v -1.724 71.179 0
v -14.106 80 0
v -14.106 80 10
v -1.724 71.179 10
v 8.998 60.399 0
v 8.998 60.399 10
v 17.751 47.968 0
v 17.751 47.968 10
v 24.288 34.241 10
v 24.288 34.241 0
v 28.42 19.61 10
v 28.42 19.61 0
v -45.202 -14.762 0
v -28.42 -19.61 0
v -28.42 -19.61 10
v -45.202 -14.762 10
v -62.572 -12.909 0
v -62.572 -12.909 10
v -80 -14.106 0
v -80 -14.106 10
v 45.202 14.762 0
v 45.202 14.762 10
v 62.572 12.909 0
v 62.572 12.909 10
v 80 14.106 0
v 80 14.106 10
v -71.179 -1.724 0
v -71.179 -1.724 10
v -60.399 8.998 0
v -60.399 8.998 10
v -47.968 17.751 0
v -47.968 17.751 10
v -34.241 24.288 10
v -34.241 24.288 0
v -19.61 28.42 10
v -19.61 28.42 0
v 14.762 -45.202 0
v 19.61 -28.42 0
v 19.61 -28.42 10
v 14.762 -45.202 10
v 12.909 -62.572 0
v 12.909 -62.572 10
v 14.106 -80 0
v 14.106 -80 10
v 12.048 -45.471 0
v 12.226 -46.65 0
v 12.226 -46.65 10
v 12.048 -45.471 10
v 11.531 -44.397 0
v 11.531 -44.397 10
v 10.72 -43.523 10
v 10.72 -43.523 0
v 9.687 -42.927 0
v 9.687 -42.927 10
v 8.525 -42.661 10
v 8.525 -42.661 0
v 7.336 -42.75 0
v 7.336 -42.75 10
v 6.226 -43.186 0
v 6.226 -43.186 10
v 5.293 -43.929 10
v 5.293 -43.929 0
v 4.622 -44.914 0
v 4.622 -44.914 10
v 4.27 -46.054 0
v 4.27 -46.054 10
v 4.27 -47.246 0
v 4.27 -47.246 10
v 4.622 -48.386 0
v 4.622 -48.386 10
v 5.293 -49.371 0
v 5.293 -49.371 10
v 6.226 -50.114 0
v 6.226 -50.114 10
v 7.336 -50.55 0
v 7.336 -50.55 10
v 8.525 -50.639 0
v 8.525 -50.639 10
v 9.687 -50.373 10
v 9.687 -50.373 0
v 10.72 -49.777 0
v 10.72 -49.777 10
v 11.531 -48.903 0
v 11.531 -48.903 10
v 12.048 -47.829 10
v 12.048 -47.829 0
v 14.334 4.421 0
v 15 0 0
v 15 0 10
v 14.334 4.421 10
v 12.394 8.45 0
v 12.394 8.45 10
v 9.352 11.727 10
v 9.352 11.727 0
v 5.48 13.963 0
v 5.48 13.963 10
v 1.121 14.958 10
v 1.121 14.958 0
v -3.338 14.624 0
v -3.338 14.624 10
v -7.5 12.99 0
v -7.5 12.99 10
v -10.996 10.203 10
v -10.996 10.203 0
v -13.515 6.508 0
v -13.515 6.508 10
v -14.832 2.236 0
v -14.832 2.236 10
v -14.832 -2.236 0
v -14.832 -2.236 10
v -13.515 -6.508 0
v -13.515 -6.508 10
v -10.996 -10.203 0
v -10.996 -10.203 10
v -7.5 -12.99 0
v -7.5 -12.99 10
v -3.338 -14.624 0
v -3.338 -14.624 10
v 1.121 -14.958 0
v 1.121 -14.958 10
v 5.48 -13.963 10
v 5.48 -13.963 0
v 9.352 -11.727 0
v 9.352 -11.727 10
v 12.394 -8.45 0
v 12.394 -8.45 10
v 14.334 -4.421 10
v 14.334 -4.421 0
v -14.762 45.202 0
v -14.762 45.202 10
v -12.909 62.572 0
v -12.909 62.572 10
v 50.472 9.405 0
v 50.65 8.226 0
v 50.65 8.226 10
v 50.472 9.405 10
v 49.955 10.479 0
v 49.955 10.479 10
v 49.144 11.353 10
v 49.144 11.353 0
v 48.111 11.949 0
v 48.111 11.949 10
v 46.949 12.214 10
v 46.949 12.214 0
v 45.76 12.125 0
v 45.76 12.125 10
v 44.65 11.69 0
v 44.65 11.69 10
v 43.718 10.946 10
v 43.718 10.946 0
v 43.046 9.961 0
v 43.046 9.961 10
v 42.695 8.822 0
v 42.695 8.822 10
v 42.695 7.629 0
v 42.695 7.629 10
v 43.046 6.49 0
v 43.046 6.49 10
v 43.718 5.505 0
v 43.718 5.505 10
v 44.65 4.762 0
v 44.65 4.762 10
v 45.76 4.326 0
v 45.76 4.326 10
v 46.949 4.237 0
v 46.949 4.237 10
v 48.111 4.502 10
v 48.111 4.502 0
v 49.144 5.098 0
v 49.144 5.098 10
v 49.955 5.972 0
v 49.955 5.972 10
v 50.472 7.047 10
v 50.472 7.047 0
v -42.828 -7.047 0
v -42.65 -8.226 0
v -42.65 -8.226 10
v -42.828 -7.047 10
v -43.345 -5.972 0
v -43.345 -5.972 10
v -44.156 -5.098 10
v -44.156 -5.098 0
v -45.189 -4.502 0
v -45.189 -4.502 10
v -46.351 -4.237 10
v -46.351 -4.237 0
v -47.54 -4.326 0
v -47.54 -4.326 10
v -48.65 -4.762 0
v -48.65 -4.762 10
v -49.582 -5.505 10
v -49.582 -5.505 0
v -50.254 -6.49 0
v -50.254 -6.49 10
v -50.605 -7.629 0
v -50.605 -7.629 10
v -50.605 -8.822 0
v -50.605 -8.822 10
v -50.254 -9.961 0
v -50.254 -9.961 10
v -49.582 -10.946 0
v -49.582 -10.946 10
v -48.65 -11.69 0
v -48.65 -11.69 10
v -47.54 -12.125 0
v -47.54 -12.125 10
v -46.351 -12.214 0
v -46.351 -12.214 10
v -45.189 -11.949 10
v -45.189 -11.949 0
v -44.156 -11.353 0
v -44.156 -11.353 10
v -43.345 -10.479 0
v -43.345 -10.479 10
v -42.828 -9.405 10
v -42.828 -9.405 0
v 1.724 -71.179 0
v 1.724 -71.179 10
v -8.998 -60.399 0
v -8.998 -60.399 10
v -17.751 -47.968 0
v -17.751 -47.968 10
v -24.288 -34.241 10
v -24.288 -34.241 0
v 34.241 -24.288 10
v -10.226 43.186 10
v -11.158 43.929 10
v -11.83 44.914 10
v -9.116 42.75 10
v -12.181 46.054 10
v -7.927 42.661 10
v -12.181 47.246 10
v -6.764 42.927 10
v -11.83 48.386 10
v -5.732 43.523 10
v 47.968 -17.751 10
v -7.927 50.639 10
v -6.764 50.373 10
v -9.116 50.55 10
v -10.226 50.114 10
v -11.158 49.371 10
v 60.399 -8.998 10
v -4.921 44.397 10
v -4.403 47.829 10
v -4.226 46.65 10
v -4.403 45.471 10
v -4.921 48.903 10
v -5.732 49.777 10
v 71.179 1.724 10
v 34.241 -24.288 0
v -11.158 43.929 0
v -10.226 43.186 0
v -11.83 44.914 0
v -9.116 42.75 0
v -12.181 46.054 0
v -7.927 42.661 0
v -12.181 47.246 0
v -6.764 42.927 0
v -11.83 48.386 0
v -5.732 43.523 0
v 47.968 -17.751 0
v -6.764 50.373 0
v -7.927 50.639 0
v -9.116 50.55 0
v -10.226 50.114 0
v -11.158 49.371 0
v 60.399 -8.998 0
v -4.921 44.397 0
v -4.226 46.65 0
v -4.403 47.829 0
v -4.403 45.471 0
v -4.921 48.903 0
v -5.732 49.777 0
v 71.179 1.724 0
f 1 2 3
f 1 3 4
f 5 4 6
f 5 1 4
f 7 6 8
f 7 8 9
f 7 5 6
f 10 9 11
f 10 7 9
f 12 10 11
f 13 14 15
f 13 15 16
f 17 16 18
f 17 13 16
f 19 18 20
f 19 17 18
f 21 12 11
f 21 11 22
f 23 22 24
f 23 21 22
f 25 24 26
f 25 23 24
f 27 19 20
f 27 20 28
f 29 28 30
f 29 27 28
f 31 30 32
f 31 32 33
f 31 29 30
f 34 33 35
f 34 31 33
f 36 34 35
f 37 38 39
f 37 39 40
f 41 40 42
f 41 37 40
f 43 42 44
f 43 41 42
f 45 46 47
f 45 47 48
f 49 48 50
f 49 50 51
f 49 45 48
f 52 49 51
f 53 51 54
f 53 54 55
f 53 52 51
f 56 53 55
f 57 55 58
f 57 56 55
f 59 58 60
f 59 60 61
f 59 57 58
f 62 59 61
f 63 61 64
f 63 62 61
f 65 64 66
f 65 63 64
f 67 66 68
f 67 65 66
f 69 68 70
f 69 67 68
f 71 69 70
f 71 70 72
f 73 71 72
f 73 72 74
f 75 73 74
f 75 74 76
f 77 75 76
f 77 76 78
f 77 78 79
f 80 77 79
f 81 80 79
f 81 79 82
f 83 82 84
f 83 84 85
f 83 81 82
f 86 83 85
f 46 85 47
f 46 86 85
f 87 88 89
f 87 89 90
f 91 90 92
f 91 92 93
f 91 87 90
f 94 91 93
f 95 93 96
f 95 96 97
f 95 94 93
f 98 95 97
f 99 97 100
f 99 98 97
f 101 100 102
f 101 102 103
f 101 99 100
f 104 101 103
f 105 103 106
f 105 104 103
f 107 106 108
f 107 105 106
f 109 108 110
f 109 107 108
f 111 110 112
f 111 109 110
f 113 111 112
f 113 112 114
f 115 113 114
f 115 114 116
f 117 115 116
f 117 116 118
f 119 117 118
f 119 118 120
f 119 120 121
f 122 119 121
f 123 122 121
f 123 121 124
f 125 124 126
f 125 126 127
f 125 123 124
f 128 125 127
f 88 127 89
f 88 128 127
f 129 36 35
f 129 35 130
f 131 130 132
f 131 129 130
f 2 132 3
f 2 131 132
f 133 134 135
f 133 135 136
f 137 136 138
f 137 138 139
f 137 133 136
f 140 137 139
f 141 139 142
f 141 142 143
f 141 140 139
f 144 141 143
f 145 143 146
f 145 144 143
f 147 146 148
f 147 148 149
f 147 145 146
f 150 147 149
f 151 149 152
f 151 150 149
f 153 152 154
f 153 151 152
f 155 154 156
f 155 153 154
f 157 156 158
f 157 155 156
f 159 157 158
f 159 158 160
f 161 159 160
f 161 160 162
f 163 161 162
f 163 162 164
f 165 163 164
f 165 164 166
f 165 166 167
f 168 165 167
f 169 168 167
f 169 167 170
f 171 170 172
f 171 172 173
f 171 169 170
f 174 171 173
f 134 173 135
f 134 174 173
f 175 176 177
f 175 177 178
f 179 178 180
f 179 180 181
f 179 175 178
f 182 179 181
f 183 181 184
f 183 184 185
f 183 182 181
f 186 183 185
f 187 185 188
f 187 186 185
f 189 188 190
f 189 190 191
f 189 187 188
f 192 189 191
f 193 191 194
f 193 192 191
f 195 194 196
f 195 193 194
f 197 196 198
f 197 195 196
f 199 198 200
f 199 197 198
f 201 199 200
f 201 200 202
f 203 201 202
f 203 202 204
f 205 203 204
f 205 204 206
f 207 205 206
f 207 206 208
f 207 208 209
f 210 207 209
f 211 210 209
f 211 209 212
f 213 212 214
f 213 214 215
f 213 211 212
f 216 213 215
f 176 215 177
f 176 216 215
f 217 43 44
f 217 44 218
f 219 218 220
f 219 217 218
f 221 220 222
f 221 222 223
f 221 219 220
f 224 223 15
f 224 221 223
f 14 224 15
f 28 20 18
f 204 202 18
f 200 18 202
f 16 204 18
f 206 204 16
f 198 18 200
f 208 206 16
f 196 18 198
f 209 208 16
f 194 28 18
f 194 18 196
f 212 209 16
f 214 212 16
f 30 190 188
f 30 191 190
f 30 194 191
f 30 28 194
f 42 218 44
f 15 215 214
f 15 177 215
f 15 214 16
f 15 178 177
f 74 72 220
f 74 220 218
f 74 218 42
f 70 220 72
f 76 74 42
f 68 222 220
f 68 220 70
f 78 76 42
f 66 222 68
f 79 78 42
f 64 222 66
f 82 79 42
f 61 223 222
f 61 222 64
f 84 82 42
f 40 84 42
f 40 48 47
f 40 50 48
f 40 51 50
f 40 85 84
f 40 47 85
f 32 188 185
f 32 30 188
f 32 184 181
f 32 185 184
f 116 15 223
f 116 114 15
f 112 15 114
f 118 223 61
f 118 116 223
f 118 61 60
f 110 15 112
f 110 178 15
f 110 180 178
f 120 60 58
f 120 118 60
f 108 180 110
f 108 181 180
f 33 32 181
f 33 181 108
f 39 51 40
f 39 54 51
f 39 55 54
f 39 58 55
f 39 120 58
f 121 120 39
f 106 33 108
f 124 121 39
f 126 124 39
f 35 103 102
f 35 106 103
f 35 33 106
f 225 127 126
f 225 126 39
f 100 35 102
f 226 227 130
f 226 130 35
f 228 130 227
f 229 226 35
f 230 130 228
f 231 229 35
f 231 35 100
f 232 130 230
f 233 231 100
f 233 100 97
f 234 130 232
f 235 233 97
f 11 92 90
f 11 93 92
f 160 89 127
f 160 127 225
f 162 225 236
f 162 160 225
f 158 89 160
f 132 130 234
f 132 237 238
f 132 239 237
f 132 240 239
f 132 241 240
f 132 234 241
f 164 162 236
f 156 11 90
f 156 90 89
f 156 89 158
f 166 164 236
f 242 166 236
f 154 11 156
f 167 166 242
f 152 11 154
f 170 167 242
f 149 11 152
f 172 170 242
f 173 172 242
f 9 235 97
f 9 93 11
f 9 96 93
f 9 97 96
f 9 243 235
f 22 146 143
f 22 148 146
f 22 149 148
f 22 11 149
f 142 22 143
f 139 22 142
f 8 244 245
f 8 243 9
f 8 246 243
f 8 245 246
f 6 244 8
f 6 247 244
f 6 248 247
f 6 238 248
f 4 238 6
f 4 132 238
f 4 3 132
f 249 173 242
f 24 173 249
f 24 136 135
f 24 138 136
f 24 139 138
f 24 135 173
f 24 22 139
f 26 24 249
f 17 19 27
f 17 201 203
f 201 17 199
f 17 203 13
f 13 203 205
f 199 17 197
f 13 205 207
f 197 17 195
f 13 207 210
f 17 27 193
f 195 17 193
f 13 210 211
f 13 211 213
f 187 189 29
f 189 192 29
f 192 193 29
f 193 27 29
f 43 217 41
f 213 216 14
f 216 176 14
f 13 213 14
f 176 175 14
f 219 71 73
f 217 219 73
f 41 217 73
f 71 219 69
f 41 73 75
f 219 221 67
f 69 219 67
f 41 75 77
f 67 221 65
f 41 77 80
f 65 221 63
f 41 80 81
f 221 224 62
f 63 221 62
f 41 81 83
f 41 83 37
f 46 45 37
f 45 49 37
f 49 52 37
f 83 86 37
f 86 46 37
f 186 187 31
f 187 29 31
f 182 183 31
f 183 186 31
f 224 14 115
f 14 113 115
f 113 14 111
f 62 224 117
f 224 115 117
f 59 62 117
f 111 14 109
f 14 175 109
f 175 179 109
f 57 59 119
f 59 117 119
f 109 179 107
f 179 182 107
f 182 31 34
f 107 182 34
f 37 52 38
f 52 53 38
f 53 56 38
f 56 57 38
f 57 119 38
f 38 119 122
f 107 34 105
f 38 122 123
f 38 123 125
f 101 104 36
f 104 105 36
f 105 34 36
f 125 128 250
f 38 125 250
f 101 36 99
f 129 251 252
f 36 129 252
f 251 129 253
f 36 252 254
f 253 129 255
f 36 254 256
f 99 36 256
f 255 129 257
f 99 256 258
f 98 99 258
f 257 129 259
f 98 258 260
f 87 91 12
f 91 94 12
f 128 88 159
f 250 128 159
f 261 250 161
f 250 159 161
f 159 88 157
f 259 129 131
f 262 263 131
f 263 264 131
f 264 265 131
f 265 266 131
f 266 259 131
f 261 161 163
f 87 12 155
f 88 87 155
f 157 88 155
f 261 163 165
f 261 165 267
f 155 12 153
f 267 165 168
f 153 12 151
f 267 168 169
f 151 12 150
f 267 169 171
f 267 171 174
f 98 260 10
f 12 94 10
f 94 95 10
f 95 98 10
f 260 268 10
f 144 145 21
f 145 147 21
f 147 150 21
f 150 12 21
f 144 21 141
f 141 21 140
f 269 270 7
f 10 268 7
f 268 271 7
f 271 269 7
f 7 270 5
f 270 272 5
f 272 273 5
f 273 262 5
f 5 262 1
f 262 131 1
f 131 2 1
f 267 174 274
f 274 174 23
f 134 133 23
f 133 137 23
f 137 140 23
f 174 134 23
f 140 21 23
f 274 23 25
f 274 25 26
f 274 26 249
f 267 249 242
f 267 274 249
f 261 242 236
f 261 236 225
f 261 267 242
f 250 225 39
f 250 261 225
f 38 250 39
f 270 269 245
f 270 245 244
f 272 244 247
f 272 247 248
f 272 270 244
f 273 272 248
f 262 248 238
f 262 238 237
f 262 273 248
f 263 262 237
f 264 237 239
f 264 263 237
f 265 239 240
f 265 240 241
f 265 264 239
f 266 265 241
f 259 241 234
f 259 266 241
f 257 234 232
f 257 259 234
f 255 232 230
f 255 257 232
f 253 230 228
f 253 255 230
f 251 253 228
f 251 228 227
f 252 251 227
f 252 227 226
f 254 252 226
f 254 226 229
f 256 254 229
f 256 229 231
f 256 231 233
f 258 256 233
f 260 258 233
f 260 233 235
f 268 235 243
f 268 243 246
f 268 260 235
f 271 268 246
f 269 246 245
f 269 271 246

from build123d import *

# Parameters (mm, degrees)
CROQUIS1_R              = 4
CROQUIS1_R_2            = 30
CROQUIS1_R_3            = 15
SALIENTE_EXTRUIR2_DEPTH = 10


with BuildPart() as part:
    # Croquis1 → Saliente-Extruir2 (new body)
    # profile 1 of 2: a face of its own
    with BuildSketch(Plane.XY):
        with BuildLine():
            ThreePointArc((-80, -14.106158457), (-54.368470232, 13.637354869), (-19.61, 28.42))
            ThreePointArc((-19.61, 28.42), (-13.455358454, 53.846912835), (-14.106158457, 80))
            ThreePointArc((-14.106158457, 80), (13.637354869, 54.368470232), (28.42, 19.61))
            ThreePointArc((28.42, 19.61), (53.846912835, 13.455358454), (80, 14.106158457))
            ThreePointArc((80, 14.106158457), (54.368470232, -13.637354869), (19.61, -28.42))
            ThreePointArc((19.61, -28.42), (13.455358454, -53.846912835), (14.106158457, -80))
            ThreePointArc((14.106158457, -80), (-13.637354869, -54.368470232), (-28.42, -19.61))
            ThreePointArc((-28.42, -19.61), (-53.846912835, -13.455358454), (-80, -14.106158457))
        make_face()
        with Locations((-46.65, -8.22565365)):
            Circle(CROQUIS1_R, mode=Mode.SUBTRACT)
        Circle(CROQUIS1_R_2, mode=Mode.SUBTRACT)
        with Locations((-8.22565365, 46.65)):
            Circle(CROQUIS1_R, mode=Mode.SUBTRACT)
        with Locations((46.65, 8.22565365)):
            Circle(CROQUIS1_R, mode=Mode.SUBTRACT)
        with Locations((8.22565365, -46.65)):
            Circle(CROQUIS1_R, mode=Mode.SUBTRACT)
    # profile 2 of 2: a face of its own
    with BuildSketch(Plane.XY):
        Circle(CROQUIS1_R_2)
        Circle(CROQUIS1_R_3, mode=Mode.SUBTRACT)
    extrude(amount=SALIENTE_EXTRUIR2_DEPTH)


solid = part.part
